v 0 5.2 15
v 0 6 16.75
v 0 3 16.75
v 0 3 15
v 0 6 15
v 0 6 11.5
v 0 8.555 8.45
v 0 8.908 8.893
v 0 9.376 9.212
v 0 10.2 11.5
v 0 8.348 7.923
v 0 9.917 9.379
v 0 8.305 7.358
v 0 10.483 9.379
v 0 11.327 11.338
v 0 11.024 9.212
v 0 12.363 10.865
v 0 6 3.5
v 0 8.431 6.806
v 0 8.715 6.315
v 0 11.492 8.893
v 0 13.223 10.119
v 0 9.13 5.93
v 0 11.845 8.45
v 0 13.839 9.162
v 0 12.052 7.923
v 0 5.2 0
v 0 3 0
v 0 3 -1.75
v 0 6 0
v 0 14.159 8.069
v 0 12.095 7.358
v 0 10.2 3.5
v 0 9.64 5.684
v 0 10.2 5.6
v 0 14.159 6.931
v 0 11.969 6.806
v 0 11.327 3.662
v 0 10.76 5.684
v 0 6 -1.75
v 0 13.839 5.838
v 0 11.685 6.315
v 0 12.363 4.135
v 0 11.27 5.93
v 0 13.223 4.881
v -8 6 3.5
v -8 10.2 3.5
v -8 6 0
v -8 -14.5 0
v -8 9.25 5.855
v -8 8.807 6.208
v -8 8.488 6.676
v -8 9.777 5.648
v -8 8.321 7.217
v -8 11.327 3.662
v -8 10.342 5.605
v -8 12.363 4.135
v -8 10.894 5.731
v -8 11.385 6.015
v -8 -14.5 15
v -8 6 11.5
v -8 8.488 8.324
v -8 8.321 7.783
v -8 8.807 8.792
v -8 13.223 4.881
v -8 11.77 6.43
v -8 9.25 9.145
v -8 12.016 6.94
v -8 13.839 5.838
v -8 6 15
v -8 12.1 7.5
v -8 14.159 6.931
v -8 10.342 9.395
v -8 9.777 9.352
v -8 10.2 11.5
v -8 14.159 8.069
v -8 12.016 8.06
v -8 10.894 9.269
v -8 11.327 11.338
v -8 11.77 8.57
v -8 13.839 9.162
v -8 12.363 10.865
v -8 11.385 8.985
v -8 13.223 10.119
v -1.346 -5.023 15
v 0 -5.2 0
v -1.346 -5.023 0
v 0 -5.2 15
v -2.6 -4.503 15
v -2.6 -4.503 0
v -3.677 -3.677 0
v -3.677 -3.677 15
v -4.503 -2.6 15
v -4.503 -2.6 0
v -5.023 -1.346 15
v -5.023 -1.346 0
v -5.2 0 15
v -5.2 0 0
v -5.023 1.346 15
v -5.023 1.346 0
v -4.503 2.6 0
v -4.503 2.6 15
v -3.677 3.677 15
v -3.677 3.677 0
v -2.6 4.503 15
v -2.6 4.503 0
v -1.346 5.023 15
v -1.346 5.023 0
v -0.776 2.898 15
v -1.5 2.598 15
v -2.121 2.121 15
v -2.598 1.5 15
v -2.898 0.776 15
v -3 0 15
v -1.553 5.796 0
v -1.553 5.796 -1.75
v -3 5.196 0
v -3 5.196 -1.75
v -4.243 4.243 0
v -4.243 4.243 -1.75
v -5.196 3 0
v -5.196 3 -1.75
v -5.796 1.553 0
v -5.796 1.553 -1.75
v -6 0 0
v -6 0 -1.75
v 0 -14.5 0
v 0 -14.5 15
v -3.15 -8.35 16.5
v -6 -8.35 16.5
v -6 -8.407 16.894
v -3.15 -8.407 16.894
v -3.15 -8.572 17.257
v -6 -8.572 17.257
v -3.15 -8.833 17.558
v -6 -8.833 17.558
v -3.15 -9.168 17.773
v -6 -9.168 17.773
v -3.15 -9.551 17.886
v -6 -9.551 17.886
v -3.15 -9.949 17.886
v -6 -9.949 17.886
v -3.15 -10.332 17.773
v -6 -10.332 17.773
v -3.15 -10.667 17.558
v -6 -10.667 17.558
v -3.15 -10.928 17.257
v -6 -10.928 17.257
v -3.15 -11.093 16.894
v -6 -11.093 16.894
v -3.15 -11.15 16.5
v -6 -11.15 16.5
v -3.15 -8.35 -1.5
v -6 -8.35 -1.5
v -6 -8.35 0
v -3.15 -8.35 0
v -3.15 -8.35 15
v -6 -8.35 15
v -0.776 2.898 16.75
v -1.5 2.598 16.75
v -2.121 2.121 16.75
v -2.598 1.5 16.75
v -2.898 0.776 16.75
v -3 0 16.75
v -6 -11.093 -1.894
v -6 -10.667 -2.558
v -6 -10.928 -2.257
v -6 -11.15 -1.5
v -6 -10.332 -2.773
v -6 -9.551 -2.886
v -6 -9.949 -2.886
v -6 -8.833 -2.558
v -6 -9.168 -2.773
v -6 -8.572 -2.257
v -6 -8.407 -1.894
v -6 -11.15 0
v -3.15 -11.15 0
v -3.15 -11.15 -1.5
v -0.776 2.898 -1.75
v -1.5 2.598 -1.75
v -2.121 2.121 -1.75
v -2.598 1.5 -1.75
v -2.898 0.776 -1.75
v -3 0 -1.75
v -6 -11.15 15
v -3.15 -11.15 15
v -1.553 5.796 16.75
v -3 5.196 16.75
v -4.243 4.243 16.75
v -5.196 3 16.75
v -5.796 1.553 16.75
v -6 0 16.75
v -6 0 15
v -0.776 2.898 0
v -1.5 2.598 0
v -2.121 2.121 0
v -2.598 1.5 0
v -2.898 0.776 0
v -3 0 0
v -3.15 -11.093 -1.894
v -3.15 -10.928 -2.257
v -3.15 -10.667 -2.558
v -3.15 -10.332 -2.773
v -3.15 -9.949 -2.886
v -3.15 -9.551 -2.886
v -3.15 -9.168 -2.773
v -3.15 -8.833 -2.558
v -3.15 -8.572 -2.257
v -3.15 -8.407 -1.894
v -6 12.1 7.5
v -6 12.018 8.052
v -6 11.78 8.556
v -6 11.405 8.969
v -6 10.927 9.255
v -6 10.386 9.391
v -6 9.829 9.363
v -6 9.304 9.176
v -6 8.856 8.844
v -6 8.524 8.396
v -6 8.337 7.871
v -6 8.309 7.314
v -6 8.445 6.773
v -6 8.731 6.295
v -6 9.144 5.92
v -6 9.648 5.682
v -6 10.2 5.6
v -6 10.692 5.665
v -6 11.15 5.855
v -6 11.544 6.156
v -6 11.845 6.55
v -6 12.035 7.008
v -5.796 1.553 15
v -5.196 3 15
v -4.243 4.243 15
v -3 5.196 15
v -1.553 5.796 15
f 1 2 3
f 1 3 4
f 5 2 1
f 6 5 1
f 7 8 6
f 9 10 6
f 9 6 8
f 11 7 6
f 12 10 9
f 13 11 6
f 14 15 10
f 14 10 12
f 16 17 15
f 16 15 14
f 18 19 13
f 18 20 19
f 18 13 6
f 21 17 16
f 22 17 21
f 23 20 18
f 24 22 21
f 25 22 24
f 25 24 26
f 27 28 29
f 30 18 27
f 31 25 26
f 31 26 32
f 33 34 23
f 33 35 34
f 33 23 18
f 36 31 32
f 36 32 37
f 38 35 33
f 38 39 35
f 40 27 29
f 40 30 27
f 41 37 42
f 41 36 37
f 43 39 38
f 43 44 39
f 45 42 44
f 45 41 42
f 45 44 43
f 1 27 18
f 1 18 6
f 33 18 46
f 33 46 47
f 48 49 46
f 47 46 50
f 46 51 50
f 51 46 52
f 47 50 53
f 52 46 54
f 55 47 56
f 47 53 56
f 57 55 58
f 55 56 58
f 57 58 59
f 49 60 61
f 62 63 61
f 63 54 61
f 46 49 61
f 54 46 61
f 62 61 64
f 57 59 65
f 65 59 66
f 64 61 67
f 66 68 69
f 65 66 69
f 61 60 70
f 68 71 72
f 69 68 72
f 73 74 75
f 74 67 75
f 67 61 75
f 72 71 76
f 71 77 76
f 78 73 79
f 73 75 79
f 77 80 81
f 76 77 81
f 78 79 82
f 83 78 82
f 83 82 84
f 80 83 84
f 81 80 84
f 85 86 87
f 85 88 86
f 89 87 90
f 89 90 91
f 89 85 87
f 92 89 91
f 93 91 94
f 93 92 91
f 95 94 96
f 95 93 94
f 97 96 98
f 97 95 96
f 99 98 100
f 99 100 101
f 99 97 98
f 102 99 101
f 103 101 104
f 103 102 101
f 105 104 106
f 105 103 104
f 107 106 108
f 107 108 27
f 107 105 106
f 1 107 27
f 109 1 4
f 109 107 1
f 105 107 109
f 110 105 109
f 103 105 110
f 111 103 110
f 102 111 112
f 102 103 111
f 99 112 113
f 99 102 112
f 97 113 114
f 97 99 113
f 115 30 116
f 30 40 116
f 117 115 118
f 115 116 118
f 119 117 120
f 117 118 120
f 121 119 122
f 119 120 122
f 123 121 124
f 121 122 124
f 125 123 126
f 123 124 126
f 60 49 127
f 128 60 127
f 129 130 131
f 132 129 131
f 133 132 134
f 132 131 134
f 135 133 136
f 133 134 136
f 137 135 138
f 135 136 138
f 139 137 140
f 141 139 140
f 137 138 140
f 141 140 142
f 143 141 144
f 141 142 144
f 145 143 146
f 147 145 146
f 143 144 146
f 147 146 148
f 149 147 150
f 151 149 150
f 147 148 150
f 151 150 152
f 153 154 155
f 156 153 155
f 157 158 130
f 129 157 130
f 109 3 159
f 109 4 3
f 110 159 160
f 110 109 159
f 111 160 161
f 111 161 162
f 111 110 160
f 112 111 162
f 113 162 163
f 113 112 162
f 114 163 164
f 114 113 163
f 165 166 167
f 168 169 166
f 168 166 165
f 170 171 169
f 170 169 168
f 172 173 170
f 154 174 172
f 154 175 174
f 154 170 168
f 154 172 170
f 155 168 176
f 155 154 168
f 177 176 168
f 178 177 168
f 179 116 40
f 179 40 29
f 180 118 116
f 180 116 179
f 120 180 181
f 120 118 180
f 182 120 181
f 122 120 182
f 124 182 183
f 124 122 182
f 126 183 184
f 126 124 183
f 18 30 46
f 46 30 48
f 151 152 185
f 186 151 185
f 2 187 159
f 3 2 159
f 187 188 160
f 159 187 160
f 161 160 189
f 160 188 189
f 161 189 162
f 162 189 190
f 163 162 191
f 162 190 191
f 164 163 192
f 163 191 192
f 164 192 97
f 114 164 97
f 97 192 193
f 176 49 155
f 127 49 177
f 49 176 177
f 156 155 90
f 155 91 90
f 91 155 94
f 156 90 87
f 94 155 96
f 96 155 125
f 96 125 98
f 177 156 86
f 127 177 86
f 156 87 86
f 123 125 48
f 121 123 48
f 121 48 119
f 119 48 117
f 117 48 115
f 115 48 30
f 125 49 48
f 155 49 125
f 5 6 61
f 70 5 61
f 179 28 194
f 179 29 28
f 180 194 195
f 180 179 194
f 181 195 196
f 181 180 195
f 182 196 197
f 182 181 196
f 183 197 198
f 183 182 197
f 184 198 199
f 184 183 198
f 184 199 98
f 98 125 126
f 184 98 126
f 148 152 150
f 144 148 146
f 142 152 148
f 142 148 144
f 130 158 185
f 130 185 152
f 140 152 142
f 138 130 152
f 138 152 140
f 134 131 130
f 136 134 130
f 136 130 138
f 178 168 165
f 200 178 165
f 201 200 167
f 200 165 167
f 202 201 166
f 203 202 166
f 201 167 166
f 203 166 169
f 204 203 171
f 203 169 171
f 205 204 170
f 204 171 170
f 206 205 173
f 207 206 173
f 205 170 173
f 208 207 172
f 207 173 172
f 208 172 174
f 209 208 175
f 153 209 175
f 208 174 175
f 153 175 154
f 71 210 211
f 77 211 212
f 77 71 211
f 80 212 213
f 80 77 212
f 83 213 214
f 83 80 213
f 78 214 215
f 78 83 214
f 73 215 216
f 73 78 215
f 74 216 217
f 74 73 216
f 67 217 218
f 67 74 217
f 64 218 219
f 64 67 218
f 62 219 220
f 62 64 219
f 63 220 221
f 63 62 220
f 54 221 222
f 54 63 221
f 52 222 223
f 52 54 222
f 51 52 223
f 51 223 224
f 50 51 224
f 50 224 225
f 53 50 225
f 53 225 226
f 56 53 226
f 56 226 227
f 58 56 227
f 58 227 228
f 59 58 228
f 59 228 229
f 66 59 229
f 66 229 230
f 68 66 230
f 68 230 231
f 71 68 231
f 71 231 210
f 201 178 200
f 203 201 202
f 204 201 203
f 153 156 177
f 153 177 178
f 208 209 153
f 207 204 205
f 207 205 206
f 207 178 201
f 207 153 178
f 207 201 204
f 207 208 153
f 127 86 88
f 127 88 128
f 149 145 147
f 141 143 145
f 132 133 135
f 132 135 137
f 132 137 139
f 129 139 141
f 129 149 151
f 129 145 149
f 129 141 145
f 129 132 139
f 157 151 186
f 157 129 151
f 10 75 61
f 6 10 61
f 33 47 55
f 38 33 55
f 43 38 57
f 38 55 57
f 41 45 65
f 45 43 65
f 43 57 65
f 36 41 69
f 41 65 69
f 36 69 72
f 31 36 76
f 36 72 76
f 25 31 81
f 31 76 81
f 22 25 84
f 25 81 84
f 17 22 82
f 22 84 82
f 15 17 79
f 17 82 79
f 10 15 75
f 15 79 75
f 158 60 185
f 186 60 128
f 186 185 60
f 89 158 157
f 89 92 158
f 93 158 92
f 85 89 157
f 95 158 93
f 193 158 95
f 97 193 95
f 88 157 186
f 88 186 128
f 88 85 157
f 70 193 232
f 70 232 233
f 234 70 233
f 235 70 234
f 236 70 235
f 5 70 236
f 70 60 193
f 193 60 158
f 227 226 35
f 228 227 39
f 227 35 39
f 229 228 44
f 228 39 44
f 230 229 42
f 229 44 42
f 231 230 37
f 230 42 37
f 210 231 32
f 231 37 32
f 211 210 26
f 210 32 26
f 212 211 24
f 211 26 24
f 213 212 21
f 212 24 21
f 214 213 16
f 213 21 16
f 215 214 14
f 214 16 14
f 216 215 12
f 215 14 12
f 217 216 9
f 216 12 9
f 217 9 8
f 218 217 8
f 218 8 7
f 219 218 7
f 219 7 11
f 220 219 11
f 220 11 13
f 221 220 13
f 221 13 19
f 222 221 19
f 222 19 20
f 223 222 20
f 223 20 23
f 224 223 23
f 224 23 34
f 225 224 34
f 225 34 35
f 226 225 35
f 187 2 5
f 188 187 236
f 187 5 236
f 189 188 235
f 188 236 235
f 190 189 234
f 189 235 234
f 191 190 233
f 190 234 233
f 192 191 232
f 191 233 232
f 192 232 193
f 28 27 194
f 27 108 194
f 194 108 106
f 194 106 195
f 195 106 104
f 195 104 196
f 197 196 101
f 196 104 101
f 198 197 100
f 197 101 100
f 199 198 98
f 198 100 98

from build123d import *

# Parameters (mm, degrees)
BOSS_EXTRUDE1_DEPTH       = 15
BOSS_EXTRUDE2_DEPTH       = 2.85
SKETCH4_W                 = 1.05
SKETCH4_H                 = 0.3
REVOLVE1_ANGLE            = 180
SKETCH5_R                 = 1.9
BOSS_EXTRUDE3_DEPTH       = 6
BOSS_EXTRUDE4_REACH       = 29.869
BOSS_EXTRUDE4_END_RADIUS  = 6
SKETCH6_W                 = 6
SKETCH6_H                 = 8
SKETCH8_W                 = 1.75
SKETCH8_H                 = 3
REVOLVE2_ANGLE            = 90
BOSS_EXTRUDE5_DEPTH       = 15
BOSS_EXTRUDE5_START       = -8
BOSS_EXTRUDE5_2_OUTLINE_R = 1.9
BOSS_EXTRUDE5_2_DEPTH     = 2


with BuildPart() as part:
    # Sketch1 → Boss-Extrude1 (new body)
    with BuildSketch(Plane.XY):
        with BuildLine():
            Line((0, -5), (0, -14.5))
            Line((0, -14.5), (-6, -14.5))
            Line((-6, -14.5), (-6, 0))
            ThreePointArc((-6, 0), (-4.242640687, 4.242640687), (0, 6))
            Line((0, 6), (0, 5))
            ThreePointArc((0, 5), (-5, 0), (0, -5))
        make_face()
    extrude(amount=BOSS_EXTRUDE1_DEPTH)

    # Sketch3 → Boss-Extrude2 (add)
    with BuildSketch(Plane(origin=(-6, 0, 0), x_dir=(0, 0, -1), z_dir=(1, 0, 0))):
        with BuildLine():
            Line((1.5, -8.35), (0, -8.35))
            Line((0, -8.35), (0, -11.15))
            Line((0, -11.15), (1.5, -11.15))
            ThreePointArc((1.5, -11.15), (2.9, -9.75), (1.5, -8.35))
        make_face()
        with BuildLine():
            Line((-16.5, -11.15), (-15, -11.15))
            Line((-15, -11.15), (-15, -8.35))
            Line((-15, -8.35), (-16.5, -8.35))
            ThreePointArc((-16.5, -8.35), (-17.9, -9.75), (-16.5, -11.15))
        make_face()
    extrude(amount=BOSS_EXTRUDE2_DEPTH)

    # Sketch4 → Revolve1 (revolve)
    with BuildSketch(Plane(origin=(0, 0, 0), x_dir=(0, 0, -1), z_dir=(1, 0, 0))):
        with Locations((-11.575, 4.85)):
            Rectangle(SKETCH4_W, SKETCH4_H)
        with Locations((-3.425, 4.85)):
            Rectangle(SKETCH4_W, SKETCH4_H)
    revolve(axis=Axis((0, 0, 15), (0, 0, 1)), revolution_arc=REVOLVE1_ANGLE)



with BuildPart() as body_2:
    # Sketch5 → Boss-Extrude3 (new body)
    with BuildSketch(Plane(origin=(0, 0, 0), x_dir=(0, 0, -1), z_dir=(1, 0, 0))):
        with BuildLine():
            Line((-11.5, 6), (-11.5, 10.2))
            ThreePointArc((-11.5, 10.2), (-7.5, 14.2), (-3.5, 10.2))
            Line((-3.5, 10.2), (-3.5, 6))
            Line((-3.5, 6), (-11.5, 6))
        make_face()
        with Locations((-7.5, 10.2)):
            Circle(SKETCH5_R, mode=Mode.SUBTRACT)
    extrude(amount=-BOSS_EXTRUDE3_DEPTH)


with BuildPart() as part_1:
    add(part.part)

    add(body_2.part)  # Boss-Extrude4 merges body 2
    # Boss-Extrude4: up to this cylinder (the profile starts outside it)
    boss_extrude4_end = Plane(origin=(0, 0, 7.5), z_dir=(0, 0, -1)) * Cylinder(BOSS_EXTRUDE4_END_RADIUS, 72.738, mode=Mode.PRIVATE)
    # Sketch6 → Boss-Extrude4 (add, up to the surface)
    with BuildSketch(Plane.XZ.offset(-6), mode=Mode.PRIVATE) as boss_extrude4_sk1:
        with Locations((-3, 7.5)):
            Rectangle(SKETCH6_W, SKETCH6_H)
    boss_extrude4_tool1 = extrude(boss_extrude4_sk1.sketch, amount=BOSS_EXTRUDE4_REACH, mode=Mode.PRIVATE) - boss_extrude4_end
    add(boss_extrude4_tool1.solids().sort_by_distance((-3, 6, 7.5))[0])

    # Sketch7 → Cut-Revolve1 (revolve, cut)
    with BuildSketch(Plane(origin=(0, 0, 0), x_dir=(0, 0, -1), z_dir=(1, 0, 0))):
        Polygon((-15, 5.2), (-15, 5), (-12.1, 5), (-12.1, 4.7), (-11.05, 4.7), (-11.05, 5), (-3.95, 5), (-3.95, 4.7), (-2.9, 4.7), (-2.9, 5), (0, 5), (0, 5.2), align=None)
    revolve(axis=Axis((0, 0, 15), (0, 0, -1)), mode=Mode.SUBTRACT)

    # Sketch8 → Revolve2 (revolve)
    with BuildSketch(Plane(origin=(0, 0, 0), x_dir=(0, 0, -1), z_dir=(1, 0, 0))):
        with Locations((-15.875, 4.5)):
            Rectangle(SKETCH8_W, SKETCH8_H)
        with Locations((0.875, 4.5)):
            Rectangle(SKETCH8_W, SKETCH8_H)
    revolve(axis=Axis((0, 0, 15), (0, 0, 1)), revolution_arc=REVOLVE2_ANGLE)

    # Boss-Extrude5: read off the stored shape, not the designer's step
    # Boss-Extrude5 outline → Boss-Extrude5 (add)
    with BuildSketch(Plane.XY):
        with BuildLine():
            Line((-8, -14.5), (-6, -14.5))
            Line((-6, -14.5), (-6, 0))
            ThreePointArc((-6, 0), (-4.242640687, 4.242640687), (0, 6))
            Line((0, 6), (-8, 6))
            Line((-8, 6), (-8, -14.5))
        make_face()
    extrude(amount=BOSS_EXTRUDE5_DEPTH)

    # Boss-Extrude5 2 outline → Boss-Extrude5 2 (add)
    with BuildSketch(Plane.YZ.offset(BOSS_EXTRUDE5_START)):
        with BuildLine():
            Line((10.2, 11.5), (6, 11.5))
            Line((6, 11.5), (6, 3.5))
            Line((6, 3.5), (10.2, 3.5))
            ThreePointArc((10.2, 3.5), (14.2, 7.5), (10.2, 11.5))
        make_face()
        with Locations((10.2, 7.5)):
            Circle(BOSS_EXTRUDE5_2_OUTLINE_R, mode=Mode.SUBTRACT)
    extrude(amount=BOSS_EXTRUDE5_2_DEPTH)


solid = part_1.part
